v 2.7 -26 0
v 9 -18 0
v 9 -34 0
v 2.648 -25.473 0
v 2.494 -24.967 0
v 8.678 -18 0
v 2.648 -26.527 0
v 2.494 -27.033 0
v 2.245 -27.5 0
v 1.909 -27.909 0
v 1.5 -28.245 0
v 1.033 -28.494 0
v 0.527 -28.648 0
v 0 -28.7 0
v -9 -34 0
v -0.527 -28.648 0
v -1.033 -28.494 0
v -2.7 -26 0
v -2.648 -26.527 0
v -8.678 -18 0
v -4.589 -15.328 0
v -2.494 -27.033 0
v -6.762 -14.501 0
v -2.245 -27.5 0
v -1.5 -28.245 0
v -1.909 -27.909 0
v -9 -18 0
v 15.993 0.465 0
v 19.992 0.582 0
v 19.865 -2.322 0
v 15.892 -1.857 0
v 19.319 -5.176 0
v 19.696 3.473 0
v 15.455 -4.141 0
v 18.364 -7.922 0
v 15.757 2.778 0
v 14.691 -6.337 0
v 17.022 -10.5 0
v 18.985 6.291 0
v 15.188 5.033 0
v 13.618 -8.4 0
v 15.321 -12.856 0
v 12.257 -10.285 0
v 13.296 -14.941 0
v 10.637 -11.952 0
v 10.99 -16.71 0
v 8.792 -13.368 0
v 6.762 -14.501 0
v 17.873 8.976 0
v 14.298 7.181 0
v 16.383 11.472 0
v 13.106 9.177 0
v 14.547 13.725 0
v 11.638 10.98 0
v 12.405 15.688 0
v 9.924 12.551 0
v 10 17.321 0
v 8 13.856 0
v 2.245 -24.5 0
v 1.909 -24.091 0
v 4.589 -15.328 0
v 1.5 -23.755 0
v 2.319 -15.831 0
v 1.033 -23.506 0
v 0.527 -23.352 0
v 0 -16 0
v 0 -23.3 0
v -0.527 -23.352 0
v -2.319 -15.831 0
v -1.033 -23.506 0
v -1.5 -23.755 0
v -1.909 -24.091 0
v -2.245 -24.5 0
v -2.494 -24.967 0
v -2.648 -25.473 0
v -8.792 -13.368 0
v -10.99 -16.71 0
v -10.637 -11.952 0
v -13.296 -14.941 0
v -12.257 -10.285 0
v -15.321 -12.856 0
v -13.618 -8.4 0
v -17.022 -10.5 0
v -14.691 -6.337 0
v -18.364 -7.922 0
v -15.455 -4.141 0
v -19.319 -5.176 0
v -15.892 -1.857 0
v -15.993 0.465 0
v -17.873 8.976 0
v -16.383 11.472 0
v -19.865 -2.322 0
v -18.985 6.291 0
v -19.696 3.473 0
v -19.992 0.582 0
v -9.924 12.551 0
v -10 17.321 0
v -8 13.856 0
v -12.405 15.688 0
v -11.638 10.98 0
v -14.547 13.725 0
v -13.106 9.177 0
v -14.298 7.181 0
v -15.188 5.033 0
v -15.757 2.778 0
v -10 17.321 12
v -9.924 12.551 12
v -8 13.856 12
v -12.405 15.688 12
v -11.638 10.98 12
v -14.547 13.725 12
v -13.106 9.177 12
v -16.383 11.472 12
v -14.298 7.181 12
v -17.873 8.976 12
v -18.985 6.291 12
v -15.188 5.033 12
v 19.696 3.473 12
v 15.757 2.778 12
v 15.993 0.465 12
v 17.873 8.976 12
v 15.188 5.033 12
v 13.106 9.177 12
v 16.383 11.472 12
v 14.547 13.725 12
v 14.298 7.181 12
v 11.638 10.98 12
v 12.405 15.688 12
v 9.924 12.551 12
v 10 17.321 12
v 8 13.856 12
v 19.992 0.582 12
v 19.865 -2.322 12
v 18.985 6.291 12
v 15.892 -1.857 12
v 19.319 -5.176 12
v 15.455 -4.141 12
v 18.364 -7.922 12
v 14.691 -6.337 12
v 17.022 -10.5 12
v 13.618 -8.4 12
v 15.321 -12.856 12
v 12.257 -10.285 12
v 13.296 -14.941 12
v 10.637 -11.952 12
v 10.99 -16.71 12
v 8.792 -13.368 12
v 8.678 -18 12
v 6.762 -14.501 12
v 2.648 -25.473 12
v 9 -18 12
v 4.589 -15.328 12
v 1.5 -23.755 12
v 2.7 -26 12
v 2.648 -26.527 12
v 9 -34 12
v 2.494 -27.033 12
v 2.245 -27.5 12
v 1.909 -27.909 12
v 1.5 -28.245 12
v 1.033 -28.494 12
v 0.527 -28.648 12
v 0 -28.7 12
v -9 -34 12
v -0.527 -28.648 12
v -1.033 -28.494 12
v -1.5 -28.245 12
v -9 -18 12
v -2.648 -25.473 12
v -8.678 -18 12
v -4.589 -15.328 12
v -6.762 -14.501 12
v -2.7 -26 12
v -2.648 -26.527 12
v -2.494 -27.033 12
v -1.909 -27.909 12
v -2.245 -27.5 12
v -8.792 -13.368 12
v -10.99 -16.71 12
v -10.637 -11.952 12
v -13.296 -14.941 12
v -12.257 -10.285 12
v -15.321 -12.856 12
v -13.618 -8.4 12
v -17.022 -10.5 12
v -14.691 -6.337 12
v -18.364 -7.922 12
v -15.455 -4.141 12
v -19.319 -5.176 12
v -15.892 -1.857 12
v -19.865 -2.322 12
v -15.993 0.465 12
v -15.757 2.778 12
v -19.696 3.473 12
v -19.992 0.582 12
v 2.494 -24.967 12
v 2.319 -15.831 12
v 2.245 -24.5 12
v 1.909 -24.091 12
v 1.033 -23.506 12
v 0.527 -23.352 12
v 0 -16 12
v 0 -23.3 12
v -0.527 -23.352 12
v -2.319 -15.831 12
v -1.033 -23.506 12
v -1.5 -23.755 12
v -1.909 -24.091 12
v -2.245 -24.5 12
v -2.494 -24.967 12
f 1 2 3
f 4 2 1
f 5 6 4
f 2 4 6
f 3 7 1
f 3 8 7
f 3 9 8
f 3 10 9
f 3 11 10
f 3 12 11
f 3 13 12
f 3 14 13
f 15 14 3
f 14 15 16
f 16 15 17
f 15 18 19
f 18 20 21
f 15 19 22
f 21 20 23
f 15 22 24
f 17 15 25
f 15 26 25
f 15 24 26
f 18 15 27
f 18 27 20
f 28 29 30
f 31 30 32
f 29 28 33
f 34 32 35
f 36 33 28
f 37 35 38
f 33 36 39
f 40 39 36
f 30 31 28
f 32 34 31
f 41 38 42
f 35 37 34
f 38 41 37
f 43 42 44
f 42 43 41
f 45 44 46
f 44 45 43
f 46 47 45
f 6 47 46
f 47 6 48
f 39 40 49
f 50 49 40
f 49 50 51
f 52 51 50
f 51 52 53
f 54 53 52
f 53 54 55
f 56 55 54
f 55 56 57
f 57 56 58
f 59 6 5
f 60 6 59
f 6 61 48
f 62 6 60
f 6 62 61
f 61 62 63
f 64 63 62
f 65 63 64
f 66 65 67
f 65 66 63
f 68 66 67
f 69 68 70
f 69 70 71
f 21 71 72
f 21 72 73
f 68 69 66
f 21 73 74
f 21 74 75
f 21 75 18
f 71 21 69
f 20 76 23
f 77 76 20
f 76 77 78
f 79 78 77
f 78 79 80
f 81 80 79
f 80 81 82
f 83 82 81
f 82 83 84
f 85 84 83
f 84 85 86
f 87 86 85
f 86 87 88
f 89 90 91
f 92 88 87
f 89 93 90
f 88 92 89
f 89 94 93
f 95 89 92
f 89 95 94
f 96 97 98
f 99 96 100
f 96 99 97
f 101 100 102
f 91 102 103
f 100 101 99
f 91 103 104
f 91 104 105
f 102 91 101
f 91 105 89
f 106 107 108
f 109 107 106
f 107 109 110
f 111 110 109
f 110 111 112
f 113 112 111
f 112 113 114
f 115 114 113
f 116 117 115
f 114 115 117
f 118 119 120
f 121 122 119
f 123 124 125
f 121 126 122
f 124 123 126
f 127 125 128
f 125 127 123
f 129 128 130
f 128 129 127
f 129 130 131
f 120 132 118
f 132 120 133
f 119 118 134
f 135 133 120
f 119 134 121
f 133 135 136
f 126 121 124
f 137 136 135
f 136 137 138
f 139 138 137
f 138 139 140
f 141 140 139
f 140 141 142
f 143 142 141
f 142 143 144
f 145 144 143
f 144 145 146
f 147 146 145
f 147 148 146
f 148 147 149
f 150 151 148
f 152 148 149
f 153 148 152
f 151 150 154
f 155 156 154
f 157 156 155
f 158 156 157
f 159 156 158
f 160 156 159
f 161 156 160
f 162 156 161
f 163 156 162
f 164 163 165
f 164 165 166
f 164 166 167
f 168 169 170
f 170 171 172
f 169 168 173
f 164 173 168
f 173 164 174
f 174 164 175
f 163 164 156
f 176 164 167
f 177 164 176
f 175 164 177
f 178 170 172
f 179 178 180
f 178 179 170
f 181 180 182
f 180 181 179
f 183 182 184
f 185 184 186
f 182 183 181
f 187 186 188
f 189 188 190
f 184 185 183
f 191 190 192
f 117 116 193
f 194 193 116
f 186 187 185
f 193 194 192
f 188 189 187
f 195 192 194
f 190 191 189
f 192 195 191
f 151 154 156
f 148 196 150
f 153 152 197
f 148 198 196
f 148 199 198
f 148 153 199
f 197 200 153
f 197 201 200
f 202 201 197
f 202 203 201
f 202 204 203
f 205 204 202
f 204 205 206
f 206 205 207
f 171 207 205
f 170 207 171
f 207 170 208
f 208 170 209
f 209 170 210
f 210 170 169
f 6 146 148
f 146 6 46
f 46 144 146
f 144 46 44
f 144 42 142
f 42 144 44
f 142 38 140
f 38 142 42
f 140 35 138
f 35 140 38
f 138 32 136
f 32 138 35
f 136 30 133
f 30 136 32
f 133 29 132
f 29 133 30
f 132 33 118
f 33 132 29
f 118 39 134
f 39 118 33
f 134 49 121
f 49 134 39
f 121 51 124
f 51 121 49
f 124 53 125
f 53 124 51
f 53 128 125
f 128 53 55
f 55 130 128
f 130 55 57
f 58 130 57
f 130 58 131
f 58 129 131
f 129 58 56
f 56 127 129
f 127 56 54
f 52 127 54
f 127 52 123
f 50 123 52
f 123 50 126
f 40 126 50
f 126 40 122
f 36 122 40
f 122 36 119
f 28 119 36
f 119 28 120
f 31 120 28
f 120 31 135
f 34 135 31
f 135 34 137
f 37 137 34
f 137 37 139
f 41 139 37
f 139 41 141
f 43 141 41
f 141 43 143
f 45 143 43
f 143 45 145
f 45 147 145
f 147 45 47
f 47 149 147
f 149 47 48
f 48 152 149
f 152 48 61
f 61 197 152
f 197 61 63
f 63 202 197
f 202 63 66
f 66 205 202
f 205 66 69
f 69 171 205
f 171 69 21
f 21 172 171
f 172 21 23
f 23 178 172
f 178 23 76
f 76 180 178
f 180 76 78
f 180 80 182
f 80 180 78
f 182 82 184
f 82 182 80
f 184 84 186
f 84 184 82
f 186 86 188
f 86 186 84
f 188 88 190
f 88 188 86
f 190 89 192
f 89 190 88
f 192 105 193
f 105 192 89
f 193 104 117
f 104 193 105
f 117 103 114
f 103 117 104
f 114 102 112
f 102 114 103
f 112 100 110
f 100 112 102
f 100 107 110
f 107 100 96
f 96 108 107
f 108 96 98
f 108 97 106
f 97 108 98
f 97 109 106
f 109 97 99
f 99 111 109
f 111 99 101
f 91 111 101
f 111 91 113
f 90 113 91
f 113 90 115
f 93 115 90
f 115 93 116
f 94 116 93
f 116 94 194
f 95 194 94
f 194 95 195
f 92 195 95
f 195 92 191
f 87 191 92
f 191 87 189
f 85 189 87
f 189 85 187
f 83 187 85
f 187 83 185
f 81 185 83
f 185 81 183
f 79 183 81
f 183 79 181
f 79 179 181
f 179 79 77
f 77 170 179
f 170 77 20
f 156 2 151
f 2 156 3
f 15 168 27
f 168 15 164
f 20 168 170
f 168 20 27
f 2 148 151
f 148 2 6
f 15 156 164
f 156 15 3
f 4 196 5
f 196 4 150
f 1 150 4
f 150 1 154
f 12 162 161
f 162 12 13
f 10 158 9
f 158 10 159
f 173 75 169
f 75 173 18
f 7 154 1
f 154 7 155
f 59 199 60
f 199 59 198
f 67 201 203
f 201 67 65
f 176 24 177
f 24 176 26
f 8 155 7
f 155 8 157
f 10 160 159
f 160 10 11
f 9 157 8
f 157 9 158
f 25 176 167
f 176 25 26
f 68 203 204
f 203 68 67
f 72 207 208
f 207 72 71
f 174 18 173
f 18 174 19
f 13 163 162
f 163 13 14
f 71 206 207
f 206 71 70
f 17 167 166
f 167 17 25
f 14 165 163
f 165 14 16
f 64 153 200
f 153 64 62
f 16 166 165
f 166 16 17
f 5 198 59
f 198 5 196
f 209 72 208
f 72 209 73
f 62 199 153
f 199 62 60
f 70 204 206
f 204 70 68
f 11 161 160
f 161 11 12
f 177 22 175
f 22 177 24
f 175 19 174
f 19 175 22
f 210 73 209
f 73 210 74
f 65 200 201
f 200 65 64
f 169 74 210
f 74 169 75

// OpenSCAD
$fn = 32;

// ----------------------------------------------------------------------
// Spring clip: 40 mm outside, 4 mm band, 60 degree opening
// ----------------------------------------------------------------------

// --- parameters (mm) ---
outer_r = 20;             // clip outside radius
inner_r = 16;             // clip bore radius
band = 4;                 // band thickness
clip_w = 12;              // clip width
opening = 60;             // opening angle
tab_w = 18;               // tab width
tab_len = 14;             // tab length past the clip
tab_hole = 5.4;           // tab fixing hole

clip_profile = [[-10, 17.321], [-12.405, 15.688], [-14.547, 13.725], [-16.383, 11.472], [-17.873, 8.976], [-18.985, 6.291], [-19.696, 3.473], [-19.992, 0.582], [-19.865, -2.322], [-19.319, -5.176], [-18.364, -7.922], [-17.022, -10.5], [-15.321, -12.856], [-13.296, -14.941], [-10.99, -16.71], [-8.452, -18.126], [-5.736, -19.16], [-2.899, -19.789], [0, -20], [2.899, -19.789], [5.736, -19.16], [8.452, -18.126], [10.99, -16.71], [13.296, -14.941], [15.321, -12.856], [17.022, -10.5], [18.364, -7.922], [19.319, -5.176], [19.865, -2.322], [19.992, 0.582], [19.696, 3.473], [18.985, 6.291], [17.873, 8.976], [16.383, 11.472], [14.547, 13.725], [12.405, 15.688], [10, 17.321], [8, 13.856], [9.924, 12.551], [11.638, 10.98], [13.106, 9.177], [14.298, 7.181], [15.188, 5.033], [15.757, 2.778], [15.993, 0.465], [15.892, -1.857], [15.455, -4.141], [14.691, -6.337], [13.618, -8.4], [12.257, -10.285], [10.637, -11.952], [8.792, -13.368], [6.762, -14.501], [4.589, -15.328], [2.319, -15.831], [0, -16], [-2.319, -15.831], [-4.589, -15.328], [-6.762, -14.501], [-8.792, -13.368], [-10.637, -11.952], [-12.257, -10.285], [-13.618, -8.4], [-14.691, -6.337], [-15.455, -4.141], [-15.892, -1.857], [-15.993, 0.465], [-15.757, 2.778], [-15.188, 5.033], [-14.298, 7.181], [-13.106, 9.177], [-11.638, 10.98], [-9.924, 12.551], [-8, 13.856]];

difference() {
  union() {
    linear_extrude(height = clip_w) polygon(clip_profile);
    /* mounting tab, sunk 2 mm into the band */
    translate([-9, -34, 0]) cube([tab_w, 16, clip_w]);
  }
  translate([0, -26, -2.5]) cylinder(h = clip_w + 5, d = tab_hole);
}
